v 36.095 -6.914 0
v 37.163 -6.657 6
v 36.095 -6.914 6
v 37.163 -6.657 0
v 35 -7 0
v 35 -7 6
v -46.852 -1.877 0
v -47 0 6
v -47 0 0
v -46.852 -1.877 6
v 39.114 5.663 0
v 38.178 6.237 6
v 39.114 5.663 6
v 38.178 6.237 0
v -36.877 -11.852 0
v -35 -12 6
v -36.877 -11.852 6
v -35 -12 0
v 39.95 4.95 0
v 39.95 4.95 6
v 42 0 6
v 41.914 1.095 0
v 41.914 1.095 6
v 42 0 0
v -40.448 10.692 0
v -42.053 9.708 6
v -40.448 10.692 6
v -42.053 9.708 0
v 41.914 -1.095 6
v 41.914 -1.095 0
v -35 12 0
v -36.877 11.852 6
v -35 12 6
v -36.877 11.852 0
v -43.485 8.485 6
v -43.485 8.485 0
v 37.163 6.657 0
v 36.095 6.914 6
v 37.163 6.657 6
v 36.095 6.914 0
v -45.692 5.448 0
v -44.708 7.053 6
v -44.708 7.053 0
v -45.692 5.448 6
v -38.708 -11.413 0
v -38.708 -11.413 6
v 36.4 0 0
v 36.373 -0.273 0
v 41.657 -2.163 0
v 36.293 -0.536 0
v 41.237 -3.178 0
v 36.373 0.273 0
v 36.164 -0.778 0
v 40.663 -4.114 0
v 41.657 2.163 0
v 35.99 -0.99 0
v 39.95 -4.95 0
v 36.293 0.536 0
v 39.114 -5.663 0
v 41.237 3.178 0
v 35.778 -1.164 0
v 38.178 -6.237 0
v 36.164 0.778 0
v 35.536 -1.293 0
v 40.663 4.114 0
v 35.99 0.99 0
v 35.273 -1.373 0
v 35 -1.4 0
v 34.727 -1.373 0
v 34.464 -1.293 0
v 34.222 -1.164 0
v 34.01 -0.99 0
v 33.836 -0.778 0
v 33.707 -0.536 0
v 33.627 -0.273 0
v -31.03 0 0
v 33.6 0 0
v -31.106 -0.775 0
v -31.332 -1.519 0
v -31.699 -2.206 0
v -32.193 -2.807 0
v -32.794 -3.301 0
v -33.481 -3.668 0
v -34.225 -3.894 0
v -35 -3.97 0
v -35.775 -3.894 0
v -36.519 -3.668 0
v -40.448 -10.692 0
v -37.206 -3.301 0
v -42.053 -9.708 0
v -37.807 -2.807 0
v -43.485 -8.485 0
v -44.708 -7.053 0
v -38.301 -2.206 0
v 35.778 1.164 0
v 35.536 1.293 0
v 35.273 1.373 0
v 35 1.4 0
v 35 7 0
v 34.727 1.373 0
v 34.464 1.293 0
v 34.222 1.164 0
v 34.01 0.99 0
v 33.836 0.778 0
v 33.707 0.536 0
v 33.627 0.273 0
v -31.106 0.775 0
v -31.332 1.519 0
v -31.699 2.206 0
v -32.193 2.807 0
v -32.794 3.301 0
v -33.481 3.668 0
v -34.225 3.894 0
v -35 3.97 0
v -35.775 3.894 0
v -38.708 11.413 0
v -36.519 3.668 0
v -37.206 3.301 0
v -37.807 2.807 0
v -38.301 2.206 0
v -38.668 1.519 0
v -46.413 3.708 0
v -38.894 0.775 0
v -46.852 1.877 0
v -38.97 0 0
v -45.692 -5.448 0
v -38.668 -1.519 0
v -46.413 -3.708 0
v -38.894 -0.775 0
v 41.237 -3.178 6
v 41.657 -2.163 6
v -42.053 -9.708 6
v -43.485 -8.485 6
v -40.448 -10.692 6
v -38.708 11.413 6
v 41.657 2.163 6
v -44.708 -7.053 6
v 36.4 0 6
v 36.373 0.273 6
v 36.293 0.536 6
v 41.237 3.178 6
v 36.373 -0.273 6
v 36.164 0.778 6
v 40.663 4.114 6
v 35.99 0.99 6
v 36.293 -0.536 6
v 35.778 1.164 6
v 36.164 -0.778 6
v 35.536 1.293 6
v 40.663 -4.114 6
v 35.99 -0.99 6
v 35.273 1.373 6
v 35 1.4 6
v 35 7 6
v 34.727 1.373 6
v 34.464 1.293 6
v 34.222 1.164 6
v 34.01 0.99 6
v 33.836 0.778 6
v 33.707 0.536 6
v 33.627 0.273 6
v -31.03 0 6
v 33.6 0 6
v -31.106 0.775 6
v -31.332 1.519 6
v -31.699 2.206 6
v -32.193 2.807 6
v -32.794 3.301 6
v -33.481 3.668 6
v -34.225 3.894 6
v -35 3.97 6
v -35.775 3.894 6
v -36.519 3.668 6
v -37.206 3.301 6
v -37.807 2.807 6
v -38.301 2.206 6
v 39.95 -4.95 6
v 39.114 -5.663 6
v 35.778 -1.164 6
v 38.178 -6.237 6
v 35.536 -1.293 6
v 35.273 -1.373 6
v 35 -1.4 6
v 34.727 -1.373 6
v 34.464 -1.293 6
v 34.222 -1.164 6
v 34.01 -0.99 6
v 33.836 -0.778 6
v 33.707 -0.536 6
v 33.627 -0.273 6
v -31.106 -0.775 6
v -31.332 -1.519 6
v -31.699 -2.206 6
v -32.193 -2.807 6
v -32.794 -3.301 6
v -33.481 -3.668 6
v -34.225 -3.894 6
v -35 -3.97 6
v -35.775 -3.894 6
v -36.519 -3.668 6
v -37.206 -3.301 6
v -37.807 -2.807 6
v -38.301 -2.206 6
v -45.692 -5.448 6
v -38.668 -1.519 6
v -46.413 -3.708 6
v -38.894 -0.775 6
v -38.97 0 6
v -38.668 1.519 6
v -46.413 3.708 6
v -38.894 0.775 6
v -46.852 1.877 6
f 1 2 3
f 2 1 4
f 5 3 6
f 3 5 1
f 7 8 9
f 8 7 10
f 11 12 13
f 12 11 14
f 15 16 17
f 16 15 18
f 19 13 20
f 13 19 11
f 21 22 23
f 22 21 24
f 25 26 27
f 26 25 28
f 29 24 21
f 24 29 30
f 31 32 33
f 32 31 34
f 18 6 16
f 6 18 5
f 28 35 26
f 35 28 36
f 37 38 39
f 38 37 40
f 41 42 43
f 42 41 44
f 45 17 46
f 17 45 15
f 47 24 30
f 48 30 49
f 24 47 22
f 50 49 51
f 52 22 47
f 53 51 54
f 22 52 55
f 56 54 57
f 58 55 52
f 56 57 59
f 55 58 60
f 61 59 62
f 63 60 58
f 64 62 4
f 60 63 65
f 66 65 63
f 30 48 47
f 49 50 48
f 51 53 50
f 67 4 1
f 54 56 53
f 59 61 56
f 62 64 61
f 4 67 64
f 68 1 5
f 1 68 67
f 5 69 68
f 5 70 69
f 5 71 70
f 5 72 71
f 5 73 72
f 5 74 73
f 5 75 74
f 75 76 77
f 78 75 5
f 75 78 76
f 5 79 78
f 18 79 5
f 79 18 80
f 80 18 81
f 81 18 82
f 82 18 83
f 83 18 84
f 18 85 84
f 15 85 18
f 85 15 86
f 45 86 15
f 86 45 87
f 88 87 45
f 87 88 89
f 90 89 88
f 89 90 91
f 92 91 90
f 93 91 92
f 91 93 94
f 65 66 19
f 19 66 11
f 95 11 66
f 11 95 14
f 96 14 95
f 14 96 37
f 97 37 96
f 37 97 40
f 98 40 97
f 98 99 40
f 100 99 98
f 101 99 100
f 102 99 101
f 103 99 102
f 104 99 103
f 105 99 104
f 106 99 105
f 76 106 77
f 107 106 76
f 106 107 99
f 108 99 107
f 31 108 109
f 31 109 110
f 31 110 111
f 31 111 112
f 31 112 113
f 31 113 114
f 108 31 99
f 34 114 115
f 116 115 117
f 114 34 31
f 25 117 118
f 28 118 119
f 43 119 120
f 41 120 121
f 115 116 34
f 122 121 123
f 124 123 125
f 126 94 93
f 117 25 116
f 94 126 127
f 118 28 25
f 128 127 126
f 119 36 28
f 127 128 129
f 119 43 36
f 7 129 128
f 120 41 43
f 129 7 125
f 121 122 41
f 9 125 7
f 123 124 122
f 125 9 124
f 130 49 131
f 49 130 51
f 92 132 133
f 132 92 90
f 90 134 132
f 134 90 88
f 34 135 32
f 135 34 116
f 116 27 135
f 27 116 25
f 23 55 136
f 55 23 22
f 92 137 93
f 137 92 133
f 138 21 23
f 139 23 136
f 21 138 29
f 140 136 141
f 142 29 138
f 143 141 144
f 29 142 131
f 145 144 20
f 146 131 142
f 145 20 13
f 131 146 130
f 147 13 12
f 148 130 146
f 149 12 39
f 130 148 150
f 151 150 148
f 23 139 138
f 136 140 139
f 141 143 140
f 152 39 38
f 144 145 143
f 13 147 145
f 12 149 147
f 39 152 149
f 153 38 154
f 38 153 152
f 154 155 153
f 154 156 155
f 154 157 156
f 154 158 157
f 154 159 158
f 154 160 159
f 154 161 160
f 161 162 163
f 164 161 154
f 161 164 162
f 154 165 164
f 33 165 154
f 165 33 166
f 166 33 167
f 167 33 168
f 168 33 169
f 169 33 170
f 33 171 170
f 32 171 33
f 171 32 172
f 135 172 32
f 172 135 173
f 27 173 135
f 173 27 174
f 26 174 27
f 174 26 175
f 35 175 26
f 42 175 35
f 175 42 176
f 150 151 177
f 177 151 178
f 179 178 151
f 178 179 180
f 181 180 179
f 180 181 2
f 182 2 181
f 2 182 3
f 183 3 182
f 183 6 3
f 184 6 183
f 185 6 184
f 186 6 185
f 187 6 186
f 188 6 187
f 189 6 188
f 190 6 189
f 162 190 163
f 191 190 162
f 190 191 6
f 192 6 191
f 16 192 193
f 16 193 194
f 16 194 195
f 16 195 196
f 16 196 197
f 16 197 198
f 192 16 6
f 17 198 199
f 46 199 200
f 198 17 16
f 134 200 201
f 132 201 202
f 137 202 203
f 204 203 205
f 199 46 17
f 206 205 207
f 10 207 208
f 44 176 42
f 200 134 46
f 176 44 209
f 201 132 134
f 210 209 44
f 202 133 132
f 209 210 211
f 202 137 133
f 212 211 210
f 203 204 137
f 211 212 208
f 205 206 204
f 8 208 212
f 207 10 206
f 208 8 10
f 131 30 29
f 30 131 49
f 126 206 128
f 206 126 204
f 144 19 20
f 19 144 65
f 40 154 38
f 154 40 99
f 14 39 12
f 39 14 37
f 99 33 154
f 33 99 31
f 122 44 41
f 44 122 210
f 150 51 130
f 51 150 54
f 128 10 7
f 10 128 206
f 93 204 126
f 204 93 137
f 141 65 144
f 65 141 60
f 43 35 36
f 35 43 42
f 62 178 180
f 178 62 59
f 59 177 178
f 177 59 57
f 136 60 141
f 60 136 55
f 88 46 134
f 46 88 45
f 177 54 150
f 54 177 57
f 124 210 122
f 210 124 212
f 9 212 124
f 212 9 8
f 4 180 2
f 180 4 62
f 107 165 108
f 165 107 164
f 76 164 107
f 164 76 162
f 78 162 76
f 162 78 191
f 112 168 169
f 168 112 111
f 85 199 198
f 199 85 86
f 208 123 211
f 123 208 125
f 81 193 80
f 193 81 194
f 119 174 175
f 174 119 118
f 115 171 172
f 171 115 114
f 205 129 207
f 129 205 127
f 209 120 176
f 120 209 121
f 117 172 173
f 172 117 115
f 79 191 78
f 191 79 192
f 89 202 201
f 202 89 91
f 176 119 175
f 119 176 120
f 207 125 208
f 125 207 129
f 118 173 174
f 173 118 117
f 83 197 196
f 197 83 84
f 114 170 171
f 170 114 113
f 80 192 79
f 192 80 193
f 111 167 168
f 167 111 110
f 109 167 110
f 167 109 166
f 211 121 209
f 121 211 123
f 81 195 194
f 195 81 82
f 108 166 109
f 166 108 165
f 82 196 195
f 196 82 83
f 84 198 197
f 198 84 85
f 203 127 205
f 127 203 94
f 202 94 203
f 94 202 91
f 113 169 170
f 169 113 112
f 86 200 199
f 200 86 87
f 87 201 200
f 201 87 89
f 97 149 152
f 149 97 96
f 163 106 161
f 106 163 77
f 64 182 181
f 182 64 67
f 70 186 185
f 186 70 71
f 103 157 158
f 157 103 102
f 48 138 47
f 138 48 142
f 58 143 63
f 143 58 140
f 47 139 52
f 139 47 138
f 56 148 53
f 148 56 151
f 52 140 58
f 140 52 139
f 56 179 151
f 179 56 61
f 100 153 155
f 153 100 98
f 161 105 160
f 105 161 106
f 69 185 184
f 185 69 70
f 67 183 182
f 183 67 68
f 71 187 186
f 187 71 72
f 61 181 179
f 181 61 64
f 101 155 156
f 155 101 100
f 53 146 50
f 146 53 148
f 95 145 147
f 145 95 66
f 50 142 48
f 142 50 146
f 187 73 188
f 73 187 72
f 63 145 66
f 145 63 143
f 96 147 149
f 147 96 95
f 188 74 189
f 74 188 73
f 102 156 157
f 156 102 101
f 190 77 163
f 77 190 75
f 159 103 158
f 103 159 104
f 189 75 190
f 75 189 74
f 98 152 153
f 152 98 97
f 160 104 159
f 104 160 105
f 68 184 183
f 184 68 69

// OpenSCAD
$fn = 32;

// ----------------------------------------------------------------------
// Lever: 70 mm between the bosses, 6 mm thick, smooth outline
// ----------------------------------------------------------------------

// --- parameters (mm) ---
lever_l = 70;             // distance between the boss centres
boss_a = 24;              // first boss diameter
boss_b = 14;              // second boss diameter
bore_a = 7.94;            // first bore
bore_b = 2.8;             // second bore
lever_t = 6;              // lever thickness

lever_profile = [[-47, 0], [-46.852, -1.877], [-46.413, -3.708], [-45.692, -5.448], [-44.708, -7.053], [-43.485, -8.485], [-42.053, -9.708], [-40.448, -10.692], [-38.708, -11.413], [-36.877, -11.852], [-35, -12], [35, -7], [36.095, -6.914], [37.163, -6.657], [38.178, -6.237], [39.114, -5.663], [39.95, -4.95], [40.663, -4.114], [41.237, -3.178], [41.657, -2.163], [41.914, -1.095], [42, 0], [41.914, 1.095], [41.657, 2.163], [41.237, 3.178], [40.663, 4.114], [39.95, 4.95], [39.114, 5.663], [38.178, 6.237], [37.163, 6.657], [36.095, 6.914], [35, 7], [-35, 12], [-36.877, 11.852], [-38.708, 11.413], [-40.448, 10.692], [-42.053, 9.708], [-43.485, 8.485], [-44.708, 7.053], [-45.692, 5.448], [-46.413, 3.708], [-46.852, 1.877]];

difference() {
  linear_extrude(height = lever_t) polygon(lever_profile);
  translate([-35, 0, -2.5]) cylinder(h = lever_t + 5, d = bore_a);
  translate([35, 0, -2.5]) cylinder(h = lever_t + 5, d = bore_b);
}
